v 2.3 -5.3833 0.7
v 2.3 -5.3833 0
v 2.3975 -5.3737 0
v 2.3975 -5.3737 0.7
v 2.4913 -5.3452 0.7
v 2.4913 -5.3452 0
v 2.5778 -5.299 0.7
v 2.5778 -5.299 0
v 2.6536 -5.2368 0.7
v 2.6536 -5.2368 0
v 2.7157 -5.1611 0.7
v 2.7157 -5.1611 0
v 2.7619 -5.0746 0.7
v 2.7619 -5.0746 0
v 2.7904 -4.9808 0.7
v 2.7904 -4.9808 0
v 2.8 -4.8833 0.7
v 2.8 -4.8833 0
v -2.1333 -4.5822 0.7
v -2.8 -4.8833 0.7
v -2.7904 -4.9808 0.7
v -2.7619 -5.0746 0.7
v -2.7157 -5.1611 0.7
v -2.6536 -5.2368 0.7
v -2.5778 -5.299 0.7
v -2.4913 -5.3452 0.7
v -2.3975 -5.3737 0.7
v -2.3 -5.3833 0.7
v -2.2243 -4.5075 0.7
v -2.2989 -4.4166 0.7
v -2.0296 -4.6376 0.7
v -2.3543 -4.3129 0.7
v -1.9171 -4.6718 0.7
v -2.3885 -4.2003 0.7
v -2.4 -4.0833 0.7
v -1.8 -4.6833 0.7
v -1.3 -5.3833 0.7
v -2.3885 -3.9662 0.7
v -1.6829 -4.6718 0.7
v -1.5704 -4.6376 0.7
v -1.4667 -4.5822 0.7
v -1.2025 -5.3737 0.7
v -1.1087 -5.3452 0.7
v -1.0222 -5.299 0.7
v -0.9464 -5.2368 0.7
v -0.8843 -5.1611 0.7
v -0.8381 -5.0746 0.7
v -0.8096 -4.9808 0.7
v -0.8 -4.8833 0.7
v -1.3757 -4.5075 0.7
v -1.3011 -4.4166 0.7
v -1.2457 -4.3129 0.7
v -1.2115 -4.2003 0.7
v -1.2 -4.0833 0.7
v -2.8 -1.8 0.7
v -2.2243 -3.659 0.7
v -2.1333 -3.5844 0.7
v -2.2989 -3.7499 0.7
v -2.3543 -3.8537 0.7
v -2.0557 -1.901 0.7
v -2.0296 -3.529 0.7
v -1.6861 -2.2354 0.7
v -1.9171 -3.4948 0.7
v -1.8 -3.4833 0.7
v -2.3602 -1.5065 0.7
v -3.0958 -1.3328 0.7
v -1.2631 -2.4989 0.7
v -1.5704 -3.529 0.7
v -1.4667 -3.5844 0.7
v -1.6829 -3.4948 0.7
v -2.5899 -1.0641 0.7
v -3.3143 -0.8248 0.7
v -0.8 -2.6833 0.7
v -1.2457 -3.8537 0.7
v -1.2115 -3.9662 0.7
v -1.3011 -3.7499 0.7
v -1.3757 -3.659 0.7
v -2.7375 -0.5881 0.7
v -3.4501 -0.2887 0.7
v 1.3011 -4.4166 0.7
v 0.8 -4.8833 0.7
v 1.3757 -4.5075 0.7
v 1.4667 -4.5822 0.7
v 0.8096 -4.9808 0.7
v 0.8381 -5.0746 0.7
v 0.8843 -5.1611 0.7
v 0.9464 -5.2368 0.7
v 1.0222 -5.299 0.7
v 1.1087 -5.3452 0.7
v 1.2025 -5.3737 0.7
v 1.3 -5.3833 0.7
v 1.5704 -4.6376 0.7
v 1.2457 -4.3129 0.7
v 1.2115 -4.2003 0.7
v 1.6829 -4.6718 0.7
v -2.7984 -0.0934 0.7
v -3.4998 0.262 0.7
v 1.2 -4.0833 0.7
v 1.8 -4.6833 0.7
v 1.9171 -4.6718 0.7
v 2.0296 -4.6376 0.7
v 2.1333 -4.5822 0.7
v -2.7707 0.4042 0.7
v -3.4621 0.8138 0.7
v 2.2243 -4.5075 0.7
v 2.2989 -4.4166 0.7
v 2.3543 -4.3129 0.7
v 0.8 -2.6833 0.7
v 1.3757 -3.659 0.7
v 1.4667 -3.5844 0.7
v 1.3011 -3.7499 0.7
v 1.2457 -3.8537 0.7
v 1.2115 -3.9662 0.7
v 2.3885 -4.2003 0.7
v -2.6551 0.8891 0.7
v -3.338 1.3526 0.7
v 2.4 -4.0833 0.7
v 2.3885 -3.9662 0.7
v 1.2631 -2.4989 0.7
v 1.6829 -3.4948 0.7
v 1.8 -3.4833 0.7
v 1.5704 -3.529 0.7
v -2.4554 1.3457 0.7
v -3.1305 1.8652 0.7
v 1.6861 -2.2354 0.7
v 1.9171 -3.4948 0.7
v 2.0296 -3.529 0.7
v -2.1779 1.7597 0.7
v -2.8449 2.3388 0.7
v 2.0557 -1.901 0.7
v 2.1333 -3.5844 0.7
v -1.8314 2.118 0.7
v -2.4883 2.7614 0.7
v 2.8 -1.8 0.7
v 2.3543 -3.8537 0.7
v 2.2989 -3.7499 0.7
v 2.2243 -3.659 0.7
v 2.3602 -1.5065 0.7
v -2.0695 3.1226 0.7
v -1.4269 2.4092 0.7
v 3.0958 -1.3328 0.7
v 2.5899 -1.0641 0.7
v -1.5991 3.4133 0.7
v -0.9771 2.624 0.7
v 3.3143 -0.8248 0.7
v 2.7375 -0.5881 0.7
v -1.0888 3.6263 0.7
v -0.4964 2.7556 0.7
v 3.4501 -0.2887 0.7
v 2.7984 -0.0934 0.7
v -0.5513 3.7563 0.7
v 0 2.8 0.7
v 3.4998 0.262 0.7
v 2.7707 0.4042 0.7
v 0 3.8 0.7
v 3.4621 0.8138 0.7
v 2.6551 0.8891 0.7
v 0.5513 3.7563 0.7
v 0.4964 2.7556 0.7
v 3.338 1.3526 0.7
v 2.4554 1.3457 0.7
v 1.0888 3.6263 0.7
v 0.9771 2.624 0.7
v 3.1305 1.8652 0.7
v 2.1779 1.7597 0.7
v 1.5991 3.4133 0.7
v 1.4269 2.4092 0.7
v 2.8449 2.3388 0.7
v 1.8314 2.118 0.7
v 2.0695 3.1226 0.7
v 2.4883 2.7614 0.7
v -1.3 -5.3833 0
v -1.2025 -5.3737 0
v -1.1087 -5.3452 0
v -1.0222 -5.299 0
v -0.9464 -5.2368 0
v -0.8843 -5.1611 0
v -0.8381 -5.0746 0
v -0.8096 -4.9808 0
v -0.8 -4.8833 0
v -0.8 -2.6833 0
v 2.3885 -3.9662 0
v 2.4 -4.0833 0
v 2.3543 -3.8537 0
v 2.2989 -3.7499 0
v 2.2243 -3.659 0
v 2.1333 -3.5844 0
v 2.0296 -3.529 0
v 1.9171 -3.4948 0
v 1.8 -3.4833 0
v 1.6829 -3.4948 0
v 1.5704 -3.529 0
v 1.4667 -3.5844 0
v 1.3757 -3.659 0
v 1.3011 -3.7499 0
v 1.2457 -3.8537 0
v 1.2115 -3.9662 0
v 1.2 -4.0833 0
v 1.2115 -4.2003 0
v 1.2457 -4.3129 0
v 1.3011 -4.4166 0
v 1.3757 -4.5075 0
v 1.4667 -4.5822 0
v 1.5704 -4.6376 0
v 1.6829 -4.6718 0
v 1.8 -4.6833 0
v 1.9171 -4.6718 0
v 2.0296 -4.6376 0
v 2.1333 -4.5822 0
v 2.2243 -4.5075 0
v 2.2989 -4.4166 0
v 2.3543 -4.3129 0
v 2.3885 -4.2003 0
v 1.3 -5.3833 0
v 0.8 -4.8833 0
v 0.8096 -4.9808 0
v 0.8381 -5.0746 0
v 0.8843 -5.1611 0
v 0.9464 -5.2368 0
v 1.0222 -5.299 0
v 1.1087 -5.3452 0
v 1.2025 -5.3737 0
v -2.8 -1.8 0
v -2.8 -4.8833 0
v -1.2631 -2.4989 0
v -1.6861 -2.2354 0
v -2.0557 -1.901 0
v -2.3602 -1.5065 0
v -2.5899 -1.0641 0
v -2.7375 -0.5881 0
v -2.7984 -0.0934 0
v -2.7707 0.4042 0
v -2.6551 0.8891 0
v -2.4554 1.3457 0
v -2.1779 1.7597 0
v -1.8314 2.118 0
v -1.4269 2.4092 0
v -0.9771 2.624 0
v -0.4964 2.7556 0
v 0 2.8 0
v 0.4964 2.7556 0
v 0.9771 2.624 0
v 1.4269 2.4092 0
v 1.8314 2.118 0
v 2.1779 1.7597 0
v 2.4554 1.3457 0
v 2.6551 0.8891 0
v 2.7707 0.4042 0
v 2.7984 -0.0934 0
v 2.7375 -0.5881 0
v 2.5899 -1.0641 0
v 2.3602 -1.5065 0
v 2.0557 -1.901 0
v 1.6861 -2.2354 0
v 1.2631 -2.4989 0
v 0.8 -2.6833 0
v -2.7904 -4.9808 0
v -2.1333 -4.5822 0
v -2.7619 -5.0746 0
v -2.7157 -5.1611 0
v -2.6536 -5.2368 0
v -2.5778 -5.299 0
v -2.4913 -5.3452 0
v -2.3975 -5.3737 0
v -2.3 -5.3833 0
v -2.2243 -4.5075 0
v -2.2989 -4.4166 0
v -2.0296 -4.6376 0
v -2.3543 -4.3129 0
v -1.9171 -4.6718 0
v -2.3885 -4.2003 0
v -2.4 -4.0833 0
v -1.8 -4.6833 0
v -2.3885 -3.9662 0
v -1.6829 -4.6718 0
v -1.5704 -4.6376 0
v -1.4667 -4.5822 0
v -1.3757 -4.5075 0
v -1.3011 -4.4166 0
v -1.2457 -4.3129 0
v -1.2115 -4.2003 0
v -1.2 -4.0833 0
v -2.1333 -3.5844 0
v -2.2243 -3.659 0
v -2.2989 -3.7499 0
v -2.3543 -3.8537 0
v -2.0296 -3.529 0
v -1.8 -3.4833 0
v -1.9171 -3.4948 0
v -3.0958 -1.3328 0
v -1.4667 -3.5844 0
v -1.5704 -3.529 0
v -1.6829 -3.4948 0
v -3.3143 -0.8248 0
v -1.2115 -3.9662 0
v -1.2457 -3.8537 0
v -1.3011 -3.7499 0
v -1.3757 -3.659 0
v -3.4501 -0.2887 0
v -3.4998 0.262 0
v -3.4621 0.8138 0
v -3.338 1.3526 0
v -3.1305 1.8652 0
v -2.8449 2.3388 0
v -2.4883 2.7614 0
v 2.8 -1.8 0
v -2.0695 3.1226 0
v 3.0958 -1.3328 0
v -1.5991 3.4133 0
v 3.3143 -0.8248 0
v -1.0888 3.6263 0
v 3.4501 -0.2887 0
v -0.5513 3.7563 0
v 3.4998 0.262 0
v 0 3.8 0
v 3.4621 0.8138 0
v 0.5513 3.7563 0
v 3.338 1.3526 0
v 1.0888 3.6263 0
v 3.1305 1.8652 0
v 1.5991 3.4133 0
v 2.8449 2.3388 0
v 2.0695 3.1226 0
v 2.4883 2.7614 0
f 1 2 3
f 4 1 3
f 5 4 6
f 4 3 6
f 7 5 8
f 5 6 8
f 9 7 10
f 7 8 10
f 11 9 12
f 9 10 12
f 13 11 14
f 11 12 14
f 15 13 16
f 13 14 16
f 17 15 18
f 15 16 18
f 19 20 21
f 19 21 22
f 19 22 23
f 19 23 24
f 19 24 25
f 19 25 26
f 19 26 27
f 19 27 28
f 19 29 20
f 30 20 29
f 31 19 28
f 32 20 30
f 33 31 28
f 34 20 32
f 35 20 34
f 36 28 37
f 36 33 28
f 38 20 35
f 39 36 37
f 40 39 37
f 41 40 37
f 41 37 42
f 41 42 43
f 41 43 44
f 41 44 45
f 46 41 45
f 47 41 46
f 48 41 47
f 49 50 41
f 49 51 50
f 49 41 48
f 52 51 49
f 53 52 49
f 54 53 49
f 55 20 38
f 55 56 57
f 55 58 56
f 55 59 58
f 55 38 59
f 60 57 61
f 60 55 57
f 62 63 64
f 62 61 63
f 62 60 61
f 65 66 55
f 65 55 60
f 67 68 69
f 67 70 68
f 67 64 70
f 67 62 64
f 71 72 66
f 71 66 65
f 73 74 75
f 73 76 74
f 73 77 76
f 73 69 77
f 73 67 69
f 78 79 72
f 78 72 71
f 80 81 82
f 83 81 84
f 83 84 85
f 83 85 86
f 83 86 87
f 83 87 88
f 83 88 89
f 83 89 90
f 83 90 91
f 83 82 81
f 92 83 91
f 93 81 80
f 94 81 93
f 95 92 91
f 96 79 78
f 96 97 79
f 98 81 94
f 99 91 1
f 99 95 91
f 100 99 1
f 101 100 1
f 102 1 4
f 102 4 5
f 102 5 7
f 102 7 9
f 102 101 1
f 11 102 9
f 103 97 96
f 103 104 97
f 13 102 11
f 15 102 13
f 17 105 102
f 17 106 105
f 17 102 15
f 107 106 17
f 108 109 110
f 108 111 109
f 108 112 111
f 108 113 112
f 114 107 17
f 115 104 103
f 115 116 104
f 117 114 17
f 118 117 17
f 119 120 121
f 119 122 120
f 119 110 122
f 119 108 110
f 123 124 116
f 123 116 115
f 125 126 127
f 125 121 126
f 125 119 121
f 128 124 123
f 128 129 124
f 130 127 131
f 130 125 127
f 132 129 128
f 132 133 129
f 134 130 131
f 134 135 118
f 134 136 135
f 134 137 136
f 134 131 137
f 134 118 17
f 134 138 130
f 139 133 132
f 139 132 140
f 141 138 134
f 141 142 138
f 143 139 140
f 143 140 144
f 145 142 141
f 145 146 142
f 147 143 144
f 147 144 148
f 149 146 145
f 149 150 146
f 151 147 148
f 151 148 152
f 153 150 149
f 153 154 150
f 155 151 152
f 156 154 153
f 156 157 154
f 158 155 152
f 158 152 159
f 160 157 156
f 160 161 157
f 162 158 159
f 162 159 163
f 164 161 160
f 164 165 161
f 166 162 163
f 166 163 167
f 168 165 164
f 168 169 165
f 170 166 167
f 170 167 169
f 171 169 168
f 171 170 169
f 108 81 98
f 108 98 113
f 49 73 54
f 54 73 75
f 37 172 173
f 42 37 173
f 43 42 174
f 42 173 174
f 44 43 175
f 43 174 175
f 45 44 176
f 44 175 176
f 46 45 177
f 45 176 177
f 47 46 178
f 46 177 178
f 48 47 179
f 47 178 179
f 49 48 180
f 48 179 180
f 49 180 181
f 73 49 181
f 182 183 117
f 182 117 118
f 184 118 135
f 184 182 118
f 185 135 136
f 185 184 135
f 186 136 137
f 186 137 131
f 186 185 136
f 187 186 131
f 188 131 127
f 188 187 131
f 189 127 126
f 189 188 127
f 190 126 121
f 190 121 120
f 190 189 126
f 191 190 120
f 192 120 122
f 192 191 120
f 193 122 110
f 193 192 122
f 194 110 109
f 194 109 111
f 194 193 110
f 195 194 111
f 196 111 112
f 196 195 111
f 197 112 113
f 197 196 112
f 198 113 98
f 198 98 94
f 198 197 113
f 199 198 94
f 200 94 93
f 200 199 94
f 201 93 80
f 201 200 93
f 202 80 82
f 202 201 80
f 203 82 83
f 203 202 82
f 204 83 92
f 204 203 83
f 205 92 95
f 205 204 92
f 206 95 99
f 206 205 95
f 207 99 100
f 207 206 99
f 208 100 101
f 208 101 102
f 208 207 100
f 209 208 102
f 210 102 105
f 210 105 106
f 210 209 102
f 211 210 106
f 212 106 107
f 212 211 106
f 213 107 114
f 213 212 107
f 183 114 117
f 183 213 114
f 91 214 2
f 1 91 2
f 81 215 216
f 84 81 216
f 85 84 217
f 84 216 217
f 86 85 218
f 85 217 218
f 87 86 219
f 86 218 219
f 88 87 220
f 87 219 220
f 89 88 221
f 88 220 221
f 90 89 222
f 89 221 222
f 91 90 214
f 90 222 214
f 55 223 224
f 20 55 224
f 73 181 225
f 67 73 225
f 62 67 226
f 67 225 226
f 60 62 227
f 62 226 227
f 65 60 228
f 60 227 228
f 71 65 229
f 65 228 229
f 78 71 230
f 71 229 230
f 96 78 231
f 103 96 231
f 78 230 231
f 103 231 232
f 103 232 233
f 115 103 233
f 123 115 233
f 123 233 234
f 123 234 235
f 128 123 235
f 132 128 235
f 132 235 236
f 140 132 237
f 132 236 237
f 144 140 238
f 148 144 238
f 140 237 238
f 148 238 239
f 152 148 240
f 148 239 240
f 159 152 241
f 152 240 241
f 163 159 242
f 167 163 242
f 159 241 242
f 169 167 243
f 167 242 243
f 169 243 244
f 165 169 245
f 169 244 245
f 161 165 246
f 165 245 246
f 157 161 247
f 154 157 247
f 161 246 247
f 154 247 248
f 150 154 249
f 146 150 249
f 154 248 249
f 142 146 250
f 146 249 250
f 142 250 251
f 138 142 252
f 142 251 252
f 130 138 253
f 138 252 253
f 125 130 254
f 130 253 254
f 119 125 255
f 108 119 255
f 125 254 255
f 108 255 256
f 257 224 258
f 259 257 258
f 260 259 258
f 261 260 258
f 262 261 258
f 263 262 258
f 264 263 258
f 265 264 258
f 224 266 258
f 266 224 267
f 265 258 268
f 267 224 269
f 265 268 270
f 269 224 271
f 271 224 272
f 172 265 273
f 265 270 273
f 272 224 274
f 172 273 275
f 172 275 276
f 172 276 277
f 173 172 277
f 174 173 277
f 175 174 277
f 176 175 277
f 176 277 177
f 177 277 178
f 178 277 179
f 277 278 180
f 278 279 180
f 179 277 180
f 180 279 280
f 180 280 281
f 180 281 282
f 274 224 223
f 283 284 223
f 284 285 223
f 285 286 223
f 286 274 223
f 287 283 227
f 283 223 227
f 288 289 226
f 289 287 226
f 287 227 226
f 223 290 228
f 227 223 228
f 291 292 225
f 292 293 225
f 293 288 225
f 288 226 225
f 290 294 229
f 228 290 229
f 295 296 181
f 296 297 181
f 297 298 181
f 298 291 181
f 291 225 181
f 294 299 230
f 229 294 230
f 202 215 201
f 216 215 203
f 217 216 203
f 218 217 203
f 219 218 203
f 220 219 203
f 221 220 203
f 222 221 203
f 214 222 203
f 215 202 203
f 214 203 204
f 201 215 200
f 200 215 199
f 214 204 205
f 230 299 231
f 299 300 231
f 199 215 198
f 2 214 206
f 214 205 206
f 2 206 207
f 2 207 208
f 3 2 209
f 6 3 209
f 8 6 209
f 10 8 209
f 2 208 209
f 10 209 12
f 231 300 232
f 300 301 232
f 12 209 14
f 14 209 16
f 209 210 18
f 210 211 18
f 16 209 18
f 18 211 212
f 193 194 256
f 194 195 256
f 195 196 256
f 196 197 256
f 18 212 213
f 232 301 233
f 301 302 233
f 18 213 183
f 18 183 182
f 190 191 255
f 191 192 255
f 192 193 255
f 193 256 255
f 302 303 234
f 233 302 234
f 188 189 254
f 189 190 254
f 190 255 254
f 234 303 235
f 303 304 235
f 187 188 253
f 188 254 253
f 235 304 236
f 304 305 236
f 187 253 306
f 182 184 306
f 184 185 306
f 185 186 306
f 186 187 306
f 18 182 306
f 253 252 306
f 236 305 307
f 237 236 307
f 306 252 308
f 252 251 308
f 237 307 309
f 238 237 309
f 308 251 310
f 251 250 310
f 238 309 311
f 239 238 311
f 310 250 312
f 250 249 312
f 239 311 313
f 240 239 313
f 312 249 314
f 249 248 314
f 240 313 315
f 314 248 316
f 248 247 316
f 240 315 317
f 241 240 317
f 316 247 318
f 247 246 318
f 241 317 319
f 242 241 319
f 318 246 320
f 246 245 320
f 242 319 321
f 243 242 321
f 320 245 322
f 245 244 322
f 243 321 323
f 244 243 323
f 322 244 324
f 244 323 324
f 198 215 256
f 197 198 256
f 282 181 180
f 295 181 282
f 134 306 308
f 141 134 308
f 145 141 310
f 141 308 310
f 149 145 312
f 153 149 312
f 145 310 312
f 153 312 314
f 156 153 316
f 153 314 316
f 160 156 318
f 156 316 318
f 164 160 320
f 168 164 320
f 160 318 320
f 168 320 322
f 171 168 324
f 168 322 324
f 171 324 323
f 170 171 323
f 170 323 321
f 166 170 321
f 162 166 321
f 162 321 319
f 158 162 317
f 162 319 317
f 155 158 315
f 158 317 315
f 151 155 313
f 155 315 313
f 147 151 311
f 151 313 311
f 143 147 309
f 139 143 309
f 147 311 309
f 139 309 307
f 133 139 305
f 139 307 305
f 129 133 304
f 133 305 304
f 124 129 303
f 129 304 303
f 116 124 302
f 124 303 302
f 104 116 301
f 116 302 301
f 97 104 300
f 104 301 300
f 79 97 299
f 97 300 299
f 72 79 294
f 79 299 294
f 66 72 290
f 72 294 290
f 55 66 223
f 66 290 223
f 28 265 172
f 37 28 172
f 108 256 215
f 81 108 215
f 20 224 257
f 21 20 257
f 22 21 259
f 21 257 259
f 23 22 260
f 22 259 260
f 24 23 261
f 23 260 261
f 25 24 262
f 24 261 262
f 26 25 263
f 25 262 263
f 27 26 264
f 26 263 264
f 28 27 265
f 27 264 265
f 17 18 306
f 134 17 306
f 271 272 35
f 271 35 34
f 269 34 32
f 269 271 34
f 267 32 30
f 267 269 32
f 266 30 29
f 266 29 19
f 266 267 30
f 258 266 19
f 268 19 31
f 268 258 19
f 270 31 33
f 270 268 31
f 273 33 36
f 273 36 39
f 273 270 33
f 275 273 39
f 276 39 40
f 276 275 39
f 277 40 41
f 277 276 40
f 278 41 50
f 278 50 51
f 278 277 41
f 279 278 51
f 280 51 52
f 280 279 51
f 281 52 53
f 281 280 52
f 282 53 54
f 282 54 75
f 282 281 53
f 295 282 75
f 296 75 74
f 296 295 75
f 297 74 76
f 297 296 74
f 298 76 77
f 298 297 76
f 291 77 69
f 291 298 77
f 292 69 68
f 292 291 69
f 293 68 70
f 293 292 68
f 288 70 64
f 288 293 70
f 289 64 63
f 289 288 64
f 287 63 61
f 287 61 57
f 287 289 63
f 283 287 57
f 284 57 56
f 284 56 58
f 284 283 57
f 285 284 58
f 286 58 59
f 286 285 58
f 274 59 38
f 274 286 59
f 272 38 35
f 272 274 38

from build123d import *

# Parameters (mm, degrees)
SZKIC1_R                    = 0.6
DODANIE_WYCI_GNI_CIE1_DEPTH = 0.7


with BuildPart() as part:
    # Szkic1 → Dodanie-wyciągnięcie1 (new body)
    with BuildSketch(Plane.XY):
        with BuildLine():
            Line((0.8, -2.683281573), (0.8, -4.883281573))
            ThreePointArc((0.8, -4.883281573), (0.946446609, -5.236834964), (1.3, -5.383281573))
            Line((1.3, -5.383281573), (2.3, -5.383281573))
            ThreePointArc((2.3, -5.383281573), (2.653553391, -5.236834964), (2.8, -4.883281573))
            Line((2.8, -4.883281573), (2.8, -1.8))
            ThreePointArc((2.8, -1.8), (0, 3.8), (-2.8, -1.8))
            Line((-2.8, -1.8), (-2.8, -4.883281573))
            ThreePointArc((-2.8, -4.883281573), (-2.653553391, -5.236834964), (-2.3, -5.383281573))
            Line((-2.3, -5.383281573), (-1.3, -5.383281573))
            ThreePointArc((-1.3, -5.383281573), (-0.946446609, -5.236834964), (-0.8, -4.883281573))
            Line((-0.8, -4.883281573), (-0.8, -2.683281573))
            ThreePointArc((-0.8, -2.683281573), (0, 2.8), (0.8, -2.683281573))
        make_face()
        with Locations((1.8, -4.083281573)):
            Circle(SZKIC1_R, mode=Mode.SUBTRACT)
        with Locations(Location((-1.8, -4.083281573, 0), (0, 0, 180))):
            Circle(SZKIC1_R, mode=Mode.SUBTRACT)
    extrude(amount=DODANIE_WYCI_GNI_CIE1_DEPTH)


solid = part.part
